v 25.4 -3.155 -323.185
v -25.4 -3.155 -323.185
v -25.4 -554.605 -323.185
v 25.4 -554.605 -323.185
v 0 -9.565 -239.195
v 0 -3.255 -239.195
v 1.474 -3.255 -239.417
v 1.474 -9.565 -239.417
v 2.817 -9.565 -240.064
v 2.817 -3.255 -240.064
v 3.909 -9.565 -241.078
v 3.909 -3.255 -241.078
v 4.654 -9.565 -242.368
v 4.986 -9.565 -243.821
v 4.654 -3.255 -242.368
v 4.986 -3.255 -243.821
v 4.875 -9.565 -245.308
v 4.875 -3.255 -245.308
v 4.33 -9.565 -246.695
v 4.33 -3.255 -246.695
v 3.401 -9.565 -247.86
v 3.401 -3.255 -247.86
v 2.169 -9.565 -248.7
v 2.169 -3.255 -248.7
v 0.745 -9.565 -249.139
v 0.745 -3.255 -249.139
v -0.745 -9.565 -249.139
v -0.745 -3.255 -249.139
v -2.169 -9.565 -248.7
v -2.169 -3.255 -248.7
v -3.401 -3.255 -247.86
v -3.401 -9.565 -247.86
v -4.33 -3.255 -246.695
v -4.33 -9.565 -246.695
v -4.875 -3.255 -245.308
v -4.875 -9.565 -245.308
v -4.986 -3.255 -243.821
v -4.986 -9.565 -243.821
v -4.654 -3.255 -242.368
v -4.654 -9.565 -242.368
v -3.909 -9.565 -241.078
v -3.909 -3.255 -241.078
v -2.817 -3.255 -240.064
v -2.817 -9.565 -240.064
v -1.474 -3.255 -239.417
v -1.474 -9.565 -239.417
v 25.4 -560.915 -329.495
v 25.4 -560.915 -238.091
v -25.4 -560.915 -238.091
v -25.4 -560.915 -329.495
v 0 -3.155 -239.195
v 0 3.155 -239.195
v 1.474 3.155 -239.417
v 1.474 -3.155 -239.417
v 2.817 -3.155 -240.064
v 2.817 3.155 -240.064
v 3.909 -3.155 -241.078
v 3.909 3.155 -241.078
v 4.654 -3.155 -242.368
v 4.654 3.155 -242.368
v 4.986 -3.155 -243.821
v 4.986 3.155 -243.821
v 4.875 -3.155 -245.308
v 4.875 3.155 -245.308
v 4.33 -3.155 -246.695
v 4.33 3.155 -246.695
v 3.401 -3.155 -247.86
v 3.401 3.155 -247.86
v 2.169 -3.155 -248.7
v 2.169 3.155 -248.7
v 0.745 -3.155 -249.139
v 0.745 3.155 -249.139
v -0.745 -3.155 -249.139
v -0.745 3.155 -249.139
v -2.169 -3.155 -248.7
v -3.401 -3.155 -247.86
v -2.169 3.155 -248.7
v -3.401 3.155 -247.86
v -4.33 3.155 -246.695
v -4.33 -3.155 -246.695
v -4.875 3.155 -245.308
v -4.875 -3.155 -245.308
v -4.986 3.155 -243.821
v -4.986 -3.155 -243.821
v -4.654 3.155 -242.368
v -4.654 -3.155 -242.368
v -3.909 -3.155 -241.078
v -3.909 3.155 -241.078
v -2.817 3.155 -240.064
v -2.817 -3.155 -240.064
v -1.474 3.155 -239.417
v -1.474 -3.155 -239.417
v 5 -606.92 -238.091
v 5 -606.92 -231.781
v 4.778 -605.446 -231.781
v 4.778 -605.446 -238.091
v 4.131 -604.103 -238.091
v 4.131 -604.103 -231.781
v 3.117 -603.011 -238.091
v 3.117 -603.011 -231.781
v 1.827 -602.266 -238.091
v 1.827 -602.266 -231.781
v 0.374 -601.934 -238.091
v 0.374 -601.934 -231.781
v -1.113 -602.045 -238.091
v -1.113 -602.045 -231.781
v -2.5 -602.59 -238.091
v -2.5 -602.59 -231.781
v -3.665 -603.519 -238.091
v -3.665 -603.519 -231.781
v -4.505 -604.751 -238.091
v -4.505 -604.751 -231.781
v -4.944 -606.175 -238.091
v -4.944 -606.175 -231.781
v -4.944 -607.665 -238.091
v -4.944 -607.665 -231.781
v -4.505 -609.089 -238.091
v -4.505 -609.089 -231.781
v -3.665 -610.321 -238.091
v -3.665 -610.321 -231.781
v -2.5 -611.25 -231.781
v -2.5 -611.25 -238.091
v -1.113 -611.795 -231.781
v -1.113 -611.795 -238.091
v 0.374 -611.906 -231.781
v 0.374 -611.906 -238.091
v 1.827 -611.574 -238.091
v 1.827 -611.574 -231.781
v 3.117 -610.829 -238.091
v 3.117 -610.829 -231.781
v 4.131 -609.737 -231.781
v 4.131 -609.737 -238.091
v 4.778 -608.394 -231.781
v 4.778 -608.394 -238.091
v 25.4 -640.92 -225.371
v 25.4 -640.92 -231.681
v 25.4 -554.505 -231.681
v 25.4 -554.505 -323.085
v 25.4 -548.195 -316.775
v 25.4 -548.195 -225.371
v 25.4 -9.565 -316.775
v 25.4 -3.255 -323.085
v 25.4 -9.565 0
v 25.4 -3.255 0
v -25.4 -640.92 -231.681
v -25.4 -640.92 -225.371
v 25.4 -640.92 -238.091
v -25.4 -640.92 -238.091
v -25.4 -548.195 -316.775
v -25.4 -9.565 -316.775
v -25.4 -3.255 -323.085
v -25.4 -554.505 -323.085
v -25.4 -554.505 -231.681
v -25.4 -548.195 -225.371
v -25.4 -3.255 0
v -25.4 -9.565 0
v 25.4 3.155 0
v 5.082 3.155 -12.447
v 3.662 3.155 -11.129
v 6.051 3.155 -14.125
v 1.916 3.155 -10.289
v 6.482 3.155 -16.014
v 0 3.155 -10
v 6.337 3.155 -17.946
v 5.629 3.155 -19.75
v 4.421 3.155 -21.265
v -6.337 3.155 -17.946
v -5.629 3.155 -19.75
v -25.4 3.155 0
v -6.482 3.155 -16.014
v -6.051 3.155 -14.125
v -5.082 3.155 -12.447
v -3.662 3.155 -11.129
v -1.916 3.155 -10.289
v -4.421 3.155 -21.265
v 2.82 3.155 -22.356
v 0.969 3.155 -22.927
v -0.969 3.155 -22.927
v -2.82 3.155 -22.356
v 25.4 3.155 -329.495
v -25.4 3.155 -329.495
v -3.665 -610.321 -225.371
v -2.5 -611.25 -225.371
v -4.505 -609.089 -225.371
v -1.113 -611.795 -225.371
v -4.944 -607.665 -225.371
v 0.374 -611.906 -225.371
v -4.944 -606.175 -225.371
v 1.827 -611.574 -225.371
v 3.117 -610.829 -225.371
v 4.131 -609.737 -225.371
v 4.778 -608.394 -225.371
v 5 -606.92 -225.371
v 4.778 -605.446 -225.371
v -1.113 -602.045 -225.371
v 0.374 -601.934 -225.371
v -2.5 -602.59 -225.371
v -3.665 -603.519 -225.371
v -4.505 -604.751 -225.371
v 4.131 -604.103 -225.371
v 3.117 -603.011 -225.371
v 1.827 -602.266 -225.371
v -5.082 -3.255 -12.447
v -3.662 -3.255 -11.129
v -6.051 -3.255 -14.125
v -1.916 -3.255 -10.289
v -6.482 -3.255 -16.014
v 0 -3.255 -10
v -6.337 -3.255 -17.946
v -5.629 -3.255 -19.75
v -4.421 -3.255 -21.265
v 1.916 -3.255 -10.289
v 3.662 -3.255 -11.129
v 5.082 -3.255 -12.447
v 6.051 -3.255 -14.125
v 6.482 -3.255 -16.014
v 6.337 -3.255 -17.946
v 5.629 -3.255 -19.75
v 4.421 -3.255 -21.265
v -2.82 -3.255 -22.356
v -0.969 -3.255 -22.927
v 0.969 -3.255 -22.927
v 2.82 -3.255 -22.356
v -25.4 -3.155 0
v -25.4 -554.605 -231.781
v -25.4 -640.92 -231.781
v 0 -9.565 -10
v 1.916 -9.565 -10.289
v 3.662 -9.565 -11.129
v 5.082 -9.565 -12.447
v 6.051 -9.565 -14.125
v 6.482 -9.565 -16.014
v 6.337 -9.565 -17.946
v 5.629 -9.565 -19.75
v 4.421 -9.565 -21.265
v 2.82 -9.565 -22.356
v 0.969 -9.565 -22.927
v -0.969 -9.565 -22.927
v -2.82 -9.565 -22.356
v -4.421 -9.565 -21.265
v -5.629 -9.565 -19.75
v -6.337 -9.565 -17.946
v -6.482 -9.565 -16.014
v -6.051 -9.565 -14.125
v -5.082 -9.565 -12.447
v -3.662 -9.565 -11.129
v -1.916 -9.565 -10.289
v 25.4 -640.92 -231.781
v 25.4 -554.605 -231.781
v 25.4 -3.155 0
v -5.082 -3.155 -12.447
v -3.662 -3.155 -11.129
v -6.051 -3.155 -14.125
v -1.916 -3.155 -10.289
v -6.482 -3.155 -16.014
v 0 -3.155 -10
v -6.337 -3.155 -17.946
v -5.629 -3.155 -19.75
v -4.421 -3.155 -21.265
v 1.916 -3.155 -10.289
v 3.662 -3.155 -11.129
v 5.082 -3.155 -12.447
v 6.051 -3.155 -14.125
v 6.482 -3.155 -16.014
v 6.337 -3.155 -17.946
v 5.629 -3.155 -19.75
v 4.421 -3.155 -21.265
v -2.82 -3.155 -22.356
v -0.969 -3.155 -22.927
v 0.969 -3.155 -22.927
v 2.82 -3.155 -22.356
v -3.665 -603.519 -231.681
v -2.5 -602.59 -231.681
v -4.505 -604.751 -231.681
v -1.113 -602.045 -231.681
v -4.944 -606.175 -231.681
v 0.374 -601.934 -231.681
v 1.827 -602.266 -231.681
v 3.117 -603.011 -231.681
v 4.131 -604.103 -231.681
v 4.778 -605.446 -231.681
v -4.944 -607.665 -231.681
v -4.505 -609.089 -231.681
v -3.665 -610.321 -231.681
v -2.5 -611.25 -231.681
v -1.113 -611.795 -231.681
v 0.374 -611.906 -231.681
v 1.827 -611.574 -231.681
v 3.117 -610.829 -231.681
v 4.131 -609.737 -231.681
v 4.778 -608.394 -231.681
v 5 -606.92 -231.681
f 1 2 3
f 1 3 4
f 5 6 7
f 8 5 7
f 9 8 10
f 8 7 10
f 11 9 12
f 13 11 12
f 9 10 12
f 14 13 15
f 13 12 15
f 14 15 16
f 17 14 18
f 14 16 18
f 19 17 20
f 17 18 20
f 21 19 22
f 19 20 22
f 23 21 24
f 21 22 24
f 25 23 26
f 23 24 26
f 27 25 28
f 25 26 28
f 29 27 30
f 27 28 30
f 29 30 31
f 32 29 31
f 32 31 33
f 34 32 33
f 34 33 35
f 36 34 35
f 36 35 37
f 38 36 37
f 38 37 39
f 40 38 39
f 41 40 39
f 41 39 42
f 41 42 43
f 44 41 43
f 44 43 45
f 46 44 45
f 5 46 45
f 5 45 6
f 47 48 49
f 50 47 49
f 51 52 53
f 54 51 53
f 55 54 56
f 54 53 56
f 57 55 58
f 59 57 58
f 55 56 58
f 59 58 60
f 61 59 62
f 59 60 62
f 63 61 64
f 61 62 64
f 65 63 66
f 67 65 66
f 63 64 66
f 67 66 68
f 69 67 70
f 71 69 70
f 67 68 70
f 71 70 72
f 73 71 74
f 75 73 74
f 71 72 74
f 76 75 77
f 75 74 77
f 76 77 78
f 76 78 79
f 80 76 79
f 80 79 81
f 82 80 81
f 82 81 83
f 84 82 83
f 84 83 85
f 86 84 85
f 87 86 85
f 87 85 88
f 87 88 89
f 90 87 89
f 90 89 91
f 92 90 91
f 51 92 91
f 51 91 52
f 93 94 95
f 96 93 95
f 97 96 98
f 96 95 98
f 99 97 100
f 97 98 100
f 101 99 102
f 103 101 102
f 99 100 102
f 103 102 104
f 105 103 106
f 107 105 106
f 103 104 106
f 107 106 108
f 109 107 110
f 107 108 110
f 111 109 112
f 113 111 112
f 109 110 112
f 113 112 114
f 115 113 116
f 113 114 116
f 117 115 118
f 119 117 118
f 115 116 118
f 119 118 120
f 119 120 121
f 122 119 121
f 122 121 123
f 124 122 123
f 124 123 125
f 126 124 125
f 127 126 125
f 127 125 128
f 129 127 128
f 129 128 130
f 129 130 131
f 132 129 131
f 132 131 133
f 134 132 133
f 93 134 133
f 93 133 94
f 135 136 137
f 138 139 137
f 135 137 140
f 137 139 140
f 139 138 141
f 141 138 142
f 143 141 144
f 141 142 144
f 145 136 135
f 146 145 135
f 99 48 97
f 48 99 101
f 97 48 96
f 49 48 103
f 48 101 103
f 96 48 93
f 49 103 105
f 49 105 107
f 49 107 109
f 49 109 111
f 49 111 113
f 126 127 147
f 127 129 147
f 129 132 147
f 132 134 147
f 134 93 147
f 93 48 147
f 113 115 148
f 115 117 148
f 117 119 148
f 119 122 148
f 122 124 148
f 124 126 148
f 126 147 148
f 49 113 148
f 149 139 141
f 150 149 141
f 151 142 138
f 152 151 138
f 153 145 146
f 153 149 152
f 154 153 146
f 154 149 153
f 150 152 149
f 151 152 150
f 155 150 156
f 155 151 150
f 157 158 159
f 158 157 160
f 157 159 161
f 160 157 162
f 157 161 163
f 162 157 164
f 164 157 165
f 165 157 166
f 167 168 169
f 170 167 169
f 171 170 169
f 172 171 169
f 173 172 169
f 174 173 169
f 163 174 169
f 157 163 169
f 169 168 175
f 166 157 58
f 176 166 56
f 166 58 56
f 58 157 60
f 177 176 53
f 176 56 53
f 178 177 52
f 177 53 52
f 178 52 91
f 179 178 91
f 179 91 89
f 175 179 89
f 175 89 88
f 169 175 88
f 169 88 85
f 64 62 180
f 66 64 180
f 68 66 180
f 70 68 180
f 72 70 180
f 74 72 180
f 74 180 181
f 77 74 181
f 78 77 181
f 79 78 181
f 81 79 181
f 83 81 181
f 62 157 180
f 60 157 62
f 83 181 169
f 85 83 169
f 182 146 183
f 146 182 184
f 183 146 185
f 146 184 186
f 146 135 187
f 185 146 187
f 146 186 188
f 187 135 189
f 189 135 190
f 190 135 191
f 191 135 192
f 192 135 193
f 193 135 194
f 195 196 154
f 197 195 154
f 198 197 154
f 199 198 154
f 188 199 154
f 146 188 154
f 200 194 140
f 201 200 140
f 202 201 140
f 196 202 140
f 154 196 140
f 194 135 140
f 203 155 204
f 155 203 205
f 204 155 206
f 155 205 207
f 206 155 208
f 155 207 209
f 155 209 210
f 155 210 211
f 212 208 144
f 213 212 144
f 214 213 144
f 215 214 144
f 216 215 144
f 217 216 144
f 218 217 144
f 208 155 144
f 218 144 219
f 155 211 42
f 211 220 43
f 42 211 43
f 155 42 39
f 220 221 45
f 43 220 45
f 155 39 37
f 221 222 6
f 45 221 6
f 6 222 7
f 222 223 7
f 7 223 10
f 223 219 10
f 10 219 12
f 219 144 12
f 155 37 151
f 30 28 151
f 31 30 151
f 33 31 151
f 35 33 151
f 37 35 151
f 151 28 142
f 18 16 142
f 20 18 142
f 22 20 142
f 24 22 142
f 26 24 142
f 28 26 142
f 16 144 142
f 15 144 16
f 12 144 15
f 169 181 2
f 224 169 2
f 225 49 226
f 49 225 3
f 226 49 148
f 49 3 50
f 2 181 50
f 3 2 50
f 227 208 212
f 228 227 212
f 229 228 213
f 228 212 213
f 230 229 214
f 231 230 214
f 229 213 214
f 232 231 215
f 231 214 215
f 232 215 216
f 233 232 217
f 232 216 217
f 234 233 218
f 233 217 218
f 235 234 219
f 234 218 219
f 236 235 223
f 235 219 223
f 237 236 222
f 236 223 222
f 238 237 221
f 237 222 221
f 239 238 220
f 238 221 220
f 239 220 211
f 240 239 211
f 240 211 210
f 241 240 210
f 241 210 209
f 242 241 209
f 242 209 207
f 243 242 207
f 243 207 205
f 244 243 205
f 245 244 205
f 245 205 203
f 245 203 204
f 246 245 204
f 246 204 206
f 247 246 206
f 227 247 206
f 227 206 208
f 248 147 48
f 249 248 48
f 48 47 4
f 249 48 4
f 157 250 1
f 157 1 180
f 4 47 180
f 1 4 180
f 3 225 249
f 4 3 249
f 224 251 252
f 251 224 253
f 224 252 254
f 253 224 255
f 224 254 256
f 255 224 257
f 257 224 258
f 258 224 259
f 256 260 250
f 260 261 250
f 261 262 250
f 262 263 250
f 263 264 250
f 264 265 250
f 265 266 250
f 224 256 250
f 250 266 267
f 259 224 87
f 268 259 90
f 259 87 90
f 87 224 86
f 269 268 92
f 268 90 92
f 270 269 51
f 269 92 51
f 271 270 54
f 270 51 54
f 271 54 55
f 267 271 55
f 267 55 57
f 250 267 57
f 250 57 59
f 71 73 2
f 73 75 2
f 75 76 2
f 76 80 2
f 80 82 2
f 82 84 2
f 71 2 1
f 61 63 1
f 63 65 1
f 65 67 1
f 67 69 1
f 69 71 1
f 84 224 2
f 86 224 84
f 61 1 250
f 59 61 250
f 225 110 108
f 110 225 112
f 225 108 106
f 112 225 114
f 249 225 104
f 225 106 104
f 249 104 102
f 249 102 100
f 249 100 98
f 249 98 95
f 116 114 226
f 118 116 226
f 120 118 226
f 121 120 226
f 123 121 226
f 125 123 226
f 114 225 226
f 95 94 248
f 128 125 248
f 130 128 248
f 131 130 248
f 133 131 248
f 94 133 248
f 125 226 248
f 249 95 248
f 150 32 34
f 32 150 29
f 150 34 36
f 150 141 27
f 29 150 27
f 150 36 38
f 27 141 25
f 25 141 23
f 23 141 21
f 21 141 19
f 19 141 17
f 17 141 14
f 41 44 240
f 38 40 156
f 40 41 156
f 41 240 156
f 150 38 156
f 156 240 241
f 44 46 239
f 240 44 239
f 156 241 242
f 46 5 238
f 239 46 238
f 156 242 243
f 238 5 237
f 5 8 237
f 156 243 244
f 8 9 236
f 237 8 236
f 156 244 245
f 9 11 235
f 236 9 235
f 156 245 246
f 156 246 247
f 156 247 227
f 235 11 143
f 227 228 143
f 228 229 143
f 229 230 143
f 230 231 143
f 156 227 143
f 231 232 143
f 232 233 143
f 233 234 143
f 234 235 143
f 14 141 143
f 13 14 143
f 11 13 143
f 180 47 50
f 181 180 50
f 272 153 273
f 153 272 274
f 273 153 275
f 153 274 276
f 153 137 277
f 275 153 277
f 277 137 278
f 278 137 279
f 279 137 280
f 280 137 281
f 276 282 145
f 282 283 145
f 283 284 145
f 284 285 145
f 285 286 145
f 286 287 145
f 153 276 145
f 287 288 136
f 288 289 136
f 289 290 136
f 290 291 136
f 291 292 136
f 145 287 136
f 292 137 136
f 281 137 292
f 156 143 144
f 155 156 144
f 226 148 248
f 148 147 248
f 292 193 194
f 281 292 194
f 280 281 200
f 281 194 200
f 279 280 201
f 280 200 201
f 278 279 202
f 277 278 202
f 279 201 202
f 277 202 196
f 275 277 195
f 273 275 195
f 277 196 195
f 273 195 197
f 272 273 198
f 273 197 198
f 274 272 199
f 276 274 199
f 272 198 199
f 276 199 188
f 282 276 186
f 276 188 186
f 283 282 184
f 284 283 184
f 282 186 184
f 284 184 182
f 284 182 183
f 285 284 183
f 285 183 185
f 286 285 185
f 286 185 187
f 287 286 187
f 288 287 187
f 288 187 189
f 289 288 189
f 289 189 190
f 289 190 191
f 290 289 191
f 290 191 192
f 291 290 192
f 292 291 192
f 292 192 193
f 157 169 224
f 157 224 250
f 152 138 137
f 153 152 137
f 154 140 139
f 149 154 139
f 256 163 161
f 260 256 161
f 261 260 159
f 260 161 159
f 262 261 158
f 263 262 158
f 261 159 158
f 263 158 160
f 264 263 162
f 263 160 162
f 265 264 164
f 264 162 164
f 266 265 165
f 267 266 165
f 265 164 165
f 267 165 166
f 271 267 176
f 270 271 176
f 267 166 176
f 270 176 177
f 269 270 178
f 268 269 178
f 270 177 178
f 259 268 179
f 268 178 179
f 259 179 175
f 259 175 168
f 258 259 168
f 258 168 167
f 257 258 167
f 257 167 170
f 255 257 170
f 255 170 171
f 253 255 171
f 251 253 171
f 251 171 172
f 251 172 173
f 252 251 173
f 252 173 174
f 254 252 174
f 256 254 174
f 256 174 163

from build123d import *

# Parameters (mm, degrees)
CROQUIS1_W              = 50.8
CROQUIS1_H              = 6.31
SALIENTE_EXTRUIR1_DEPTH = 50.8
CROQUIS4_R              = 5
CORTAR_EXTRUIR2_DEPTH   = 40
CROQUIS6_R              = 6.5
CORTAR_EXTRUIR4_DEPTH   = 50
CROQUIS7_R              = 5
CORTAR_EXTRUIR5_DEPTH   = 26


with BuildPart() as part:
    # Barrer1: sweep along a curve in space
    with BuildLine() as barrer1_path:
        Line((0, 0, 0), (0, 0, -326.34))
        Line((0, 0, -326.34), (0, -557.76, -326.34))
        Line((0, -557.76, -326.34), (0, -557.76, -234.936165))
        Line((0, -557.76, -234.936165), (0, -640.92, -234.936165))
    # Croquis1 → Barrer1 (sweep)
    with BuildSketch(Plane.XY):
        Rectangle(CROQUIS1_W, CROQUIS1_H)
    sweep(path=barrer1_path.line, transition=Transition.RIGHT)


with BuildPart() as body_2:
    # Croquis2 → Saliente-Extruir1 (new body)
    with BuildSketch(Plane(origin=(25.4, 0, 0), x_dir=(0, 0, -1), z_dir=(1, 0, 0))):
        Polygon((0, -3.255), (323.085, -3.255), (323.085, -554.505), (231.681165, -554.505), (231.681165, -640.92), (225.371165, -640.92), (225.371165, -548.195), (316.775, -548.195), (316.775, -9.565), (0, -9.565), align=None)
    extrude(amount=-SALIENTE_EXTRUIR1_DEPTH)


with BuildPart() as cortar_extruir2_tool:
    # Croquis4 → Cortar-Extruir2 (new body)
    with BuildSketch(Plane(origin=(0, 3.155, 0), x_dir=(1, 0, 0), z_dir=(0, 1, 0))):
        with Locations(Location((0, 244.195, 0), (0, 0, 270))):
            Circle(CROQUIS4_R)
    extrude(amount=-CORTAR_EXTRUIR2_DEPTH)


with BuildPart() as part_1:
    add(part.part)

    # Cortar-Extruir2: cut by cortar_extruir2_tool
    add(cortar_extruir2_tool.part, mode=Mode.SUBTRACT)


with BuildPart() as body_2_1:
    add(body_2.part)

    # Cortar-Extruir2: cut by cortar_extruir2_tool
    add(cortar_extruir2_tool.part, mode=Mode.SUBTRACT)


with BuildPart() as cortar_extruir4_tool:
    # Croquis6 → Cortar-Extruir4 (new body)
    with BuildSketch(Plane(origin=(0, 3.155, 0), x_dir=(1, 0, 0), z_dir=(0, 1, 0))):
        with Locations(Location((0, 16.5, 0), (0, 0, 270))):
            Circle(CROQUIS6_R)
    extrude(amount=-CORTAR_EXTRUIR4_DEPTH)


with BuildPart() as part_2:
    add(part_1.part)

    # Cortar-Extruir4: cut by cortar_extruir4_tool
    add(cortar_extruir4_tool.part, mode=Mode.SUBTRACT)


with BuildPart() as body_2_2:
    add(body_2_1.part)

    # Cortar-Extruir4: cut by cortar_extruir4_tool
    add(cortar_extruir4_tool.part, mode=Mode.SUBTRACT)


with BuildPart() as cortar_extruir5_tool:
    # Croquis7 → Cortar-Extruir5 (new body)
    with BuildSketch(Plane.XY.offset(-225.371165)):
        with Locations((0, -606.92)):
            Circle(CROQUIS7_R)
    extrude(amount=-CORTAR_EXTRUIR5_DEPTH)


with BuildPart() as part_3:
    add(part_2.part)

    # Cortar-Extruir5: cut by cortar_extruir5_tool
    add(cortar_extruir5_tool.part, mode=Mode.SUBTRACT)


with BuildPart() as body_2_3:
    add(body_2_2.part)

    # Cortar-Extruir5: cut by cortar_extruir5_tool
    add(cortar_extruir5_tool.part, mode=Mode.SUBTRACT)


solid = Compound([part_3.part, body_2_3.part])
